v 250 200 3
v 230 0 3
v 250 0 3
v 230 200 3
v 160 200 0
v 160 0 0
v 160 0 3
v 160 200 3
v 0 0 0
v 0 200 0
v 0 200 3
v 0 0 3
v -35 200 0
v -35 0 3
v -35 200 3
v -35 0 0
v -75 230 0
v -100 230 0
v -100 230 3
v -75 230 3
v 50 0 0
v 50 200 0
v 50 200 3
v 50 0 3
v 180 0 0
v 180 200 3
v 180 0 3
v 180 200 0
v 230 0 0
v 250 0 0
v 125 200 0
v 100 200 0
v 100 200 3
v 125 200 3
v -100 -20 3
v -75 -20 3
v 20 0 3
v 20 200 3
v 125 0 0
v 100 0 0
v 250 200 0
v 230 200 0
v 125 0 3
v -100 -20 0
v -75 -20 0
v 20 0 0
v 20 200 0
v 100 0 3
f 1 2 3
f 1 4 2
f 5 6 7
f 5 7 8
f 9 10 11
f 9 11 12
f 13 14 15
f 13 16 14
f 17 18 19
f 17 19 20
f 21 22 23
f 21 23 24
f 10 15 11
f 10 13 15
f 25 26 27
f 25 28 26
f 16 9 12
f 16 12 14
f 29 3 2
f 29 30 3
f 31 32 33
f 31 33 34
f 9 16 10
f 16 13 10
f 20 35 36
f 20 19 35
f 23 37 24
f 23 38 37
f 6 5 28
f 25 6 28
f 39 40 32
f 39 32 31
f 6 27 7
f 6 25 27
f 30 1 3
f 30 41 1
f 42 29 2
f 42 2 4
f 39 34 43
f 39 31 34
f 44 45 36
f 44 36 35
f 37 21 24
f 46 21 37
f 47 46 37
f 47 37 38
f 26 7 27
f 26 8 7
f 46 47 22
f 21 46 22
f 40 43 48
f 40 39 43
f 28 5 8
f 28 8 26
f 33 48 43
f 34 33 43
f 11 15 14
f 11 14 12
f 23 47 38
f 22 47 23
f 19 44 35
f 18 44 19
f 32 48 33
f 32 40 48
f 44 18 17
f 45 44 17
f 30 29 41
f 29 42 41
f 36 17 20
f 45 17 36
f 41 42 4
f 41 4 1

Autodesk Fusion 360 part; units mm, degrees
sketch "Sketch1" plane through (0, 0, 0) normal (0, 0, 1) x (1, 0, 0)
sketch "Sketch2" plane through (0, 0, 0) normal (0, 0, 1) x (1, 0, 0)
  line L0 (-35, 200) -> (0, 200)
  line L1 (0, 200) -> (0, 0)
  line L2 (0, 0) -> (-35, 0)
  line L3 (-35, 0) -> (-35, 200)
  line L4 (20, 200) -> (50, 200)
  line L5 (50, 200) -> (50, 0)
  line L6 (50, 0) -> (20, 0)
  line L7 (20, 0) -> (20, 200)
  line L8 (100, 200) -> (125, 200)
  line L9 (125, 200) -> (125, 0)
  line L10 (125, 0) -> (100, 0)
  line L11 (100, 0) -> (100, 200)
  line L12 (160, 200) -> (180, 200)
  line L13 (180, 200) -> (180, 0)
  line L14 (180, 0) -> (160, 0)
  line L15 (160, 0) -> (160, 200)
  line L16 (230, 200) -> (250, 200)
  line L17 (250, 200) -> (250, 0)
  line L18 (250, 0) -> (230, 0)
  line L19 (230, 0) -> (230, 200)
  dimension "d1" = 200
  dimension "d2" = 35
  dimension "d3" = 30
  dimension "d4" = 200
  dimension "d5" = 25
  dimension "d6" = 20
  dimension "d7" = 20
  dimension "d8" = 200
  dimension "d9" = 200
  dimension "d10" = 200
extrude "Extrude1" add sketch "Sketch2" along normal blind 3 makes body 1 at (108.3333, 66.6667, 0) makes body 2 at (30, 133.3333, 0) makes body 3 at (166.6667, 133.3333, 0) makes body 4 at (-23.3333, 133.3333, 0) makes body 5 at (236.6667, 66.6667, 0)
sketch "Sketch3" plane through (0, 0, 0) normal (0, 0, 1) x (1, 0, 0)
  line L0 (-100, 230) -> (-75, 230)
  line L1 (-75, 230) -> (-75, -20)
  line L2 (-75, -20) -> (-100, -20)
  line L3 (-100, -20) -> (-100, 230)
  dimension "d13" = 25
  dimension "d14" = 250
extrude "Extrude2" add sketch "Sketch3" along normal blind 3 separate body makes body 6
